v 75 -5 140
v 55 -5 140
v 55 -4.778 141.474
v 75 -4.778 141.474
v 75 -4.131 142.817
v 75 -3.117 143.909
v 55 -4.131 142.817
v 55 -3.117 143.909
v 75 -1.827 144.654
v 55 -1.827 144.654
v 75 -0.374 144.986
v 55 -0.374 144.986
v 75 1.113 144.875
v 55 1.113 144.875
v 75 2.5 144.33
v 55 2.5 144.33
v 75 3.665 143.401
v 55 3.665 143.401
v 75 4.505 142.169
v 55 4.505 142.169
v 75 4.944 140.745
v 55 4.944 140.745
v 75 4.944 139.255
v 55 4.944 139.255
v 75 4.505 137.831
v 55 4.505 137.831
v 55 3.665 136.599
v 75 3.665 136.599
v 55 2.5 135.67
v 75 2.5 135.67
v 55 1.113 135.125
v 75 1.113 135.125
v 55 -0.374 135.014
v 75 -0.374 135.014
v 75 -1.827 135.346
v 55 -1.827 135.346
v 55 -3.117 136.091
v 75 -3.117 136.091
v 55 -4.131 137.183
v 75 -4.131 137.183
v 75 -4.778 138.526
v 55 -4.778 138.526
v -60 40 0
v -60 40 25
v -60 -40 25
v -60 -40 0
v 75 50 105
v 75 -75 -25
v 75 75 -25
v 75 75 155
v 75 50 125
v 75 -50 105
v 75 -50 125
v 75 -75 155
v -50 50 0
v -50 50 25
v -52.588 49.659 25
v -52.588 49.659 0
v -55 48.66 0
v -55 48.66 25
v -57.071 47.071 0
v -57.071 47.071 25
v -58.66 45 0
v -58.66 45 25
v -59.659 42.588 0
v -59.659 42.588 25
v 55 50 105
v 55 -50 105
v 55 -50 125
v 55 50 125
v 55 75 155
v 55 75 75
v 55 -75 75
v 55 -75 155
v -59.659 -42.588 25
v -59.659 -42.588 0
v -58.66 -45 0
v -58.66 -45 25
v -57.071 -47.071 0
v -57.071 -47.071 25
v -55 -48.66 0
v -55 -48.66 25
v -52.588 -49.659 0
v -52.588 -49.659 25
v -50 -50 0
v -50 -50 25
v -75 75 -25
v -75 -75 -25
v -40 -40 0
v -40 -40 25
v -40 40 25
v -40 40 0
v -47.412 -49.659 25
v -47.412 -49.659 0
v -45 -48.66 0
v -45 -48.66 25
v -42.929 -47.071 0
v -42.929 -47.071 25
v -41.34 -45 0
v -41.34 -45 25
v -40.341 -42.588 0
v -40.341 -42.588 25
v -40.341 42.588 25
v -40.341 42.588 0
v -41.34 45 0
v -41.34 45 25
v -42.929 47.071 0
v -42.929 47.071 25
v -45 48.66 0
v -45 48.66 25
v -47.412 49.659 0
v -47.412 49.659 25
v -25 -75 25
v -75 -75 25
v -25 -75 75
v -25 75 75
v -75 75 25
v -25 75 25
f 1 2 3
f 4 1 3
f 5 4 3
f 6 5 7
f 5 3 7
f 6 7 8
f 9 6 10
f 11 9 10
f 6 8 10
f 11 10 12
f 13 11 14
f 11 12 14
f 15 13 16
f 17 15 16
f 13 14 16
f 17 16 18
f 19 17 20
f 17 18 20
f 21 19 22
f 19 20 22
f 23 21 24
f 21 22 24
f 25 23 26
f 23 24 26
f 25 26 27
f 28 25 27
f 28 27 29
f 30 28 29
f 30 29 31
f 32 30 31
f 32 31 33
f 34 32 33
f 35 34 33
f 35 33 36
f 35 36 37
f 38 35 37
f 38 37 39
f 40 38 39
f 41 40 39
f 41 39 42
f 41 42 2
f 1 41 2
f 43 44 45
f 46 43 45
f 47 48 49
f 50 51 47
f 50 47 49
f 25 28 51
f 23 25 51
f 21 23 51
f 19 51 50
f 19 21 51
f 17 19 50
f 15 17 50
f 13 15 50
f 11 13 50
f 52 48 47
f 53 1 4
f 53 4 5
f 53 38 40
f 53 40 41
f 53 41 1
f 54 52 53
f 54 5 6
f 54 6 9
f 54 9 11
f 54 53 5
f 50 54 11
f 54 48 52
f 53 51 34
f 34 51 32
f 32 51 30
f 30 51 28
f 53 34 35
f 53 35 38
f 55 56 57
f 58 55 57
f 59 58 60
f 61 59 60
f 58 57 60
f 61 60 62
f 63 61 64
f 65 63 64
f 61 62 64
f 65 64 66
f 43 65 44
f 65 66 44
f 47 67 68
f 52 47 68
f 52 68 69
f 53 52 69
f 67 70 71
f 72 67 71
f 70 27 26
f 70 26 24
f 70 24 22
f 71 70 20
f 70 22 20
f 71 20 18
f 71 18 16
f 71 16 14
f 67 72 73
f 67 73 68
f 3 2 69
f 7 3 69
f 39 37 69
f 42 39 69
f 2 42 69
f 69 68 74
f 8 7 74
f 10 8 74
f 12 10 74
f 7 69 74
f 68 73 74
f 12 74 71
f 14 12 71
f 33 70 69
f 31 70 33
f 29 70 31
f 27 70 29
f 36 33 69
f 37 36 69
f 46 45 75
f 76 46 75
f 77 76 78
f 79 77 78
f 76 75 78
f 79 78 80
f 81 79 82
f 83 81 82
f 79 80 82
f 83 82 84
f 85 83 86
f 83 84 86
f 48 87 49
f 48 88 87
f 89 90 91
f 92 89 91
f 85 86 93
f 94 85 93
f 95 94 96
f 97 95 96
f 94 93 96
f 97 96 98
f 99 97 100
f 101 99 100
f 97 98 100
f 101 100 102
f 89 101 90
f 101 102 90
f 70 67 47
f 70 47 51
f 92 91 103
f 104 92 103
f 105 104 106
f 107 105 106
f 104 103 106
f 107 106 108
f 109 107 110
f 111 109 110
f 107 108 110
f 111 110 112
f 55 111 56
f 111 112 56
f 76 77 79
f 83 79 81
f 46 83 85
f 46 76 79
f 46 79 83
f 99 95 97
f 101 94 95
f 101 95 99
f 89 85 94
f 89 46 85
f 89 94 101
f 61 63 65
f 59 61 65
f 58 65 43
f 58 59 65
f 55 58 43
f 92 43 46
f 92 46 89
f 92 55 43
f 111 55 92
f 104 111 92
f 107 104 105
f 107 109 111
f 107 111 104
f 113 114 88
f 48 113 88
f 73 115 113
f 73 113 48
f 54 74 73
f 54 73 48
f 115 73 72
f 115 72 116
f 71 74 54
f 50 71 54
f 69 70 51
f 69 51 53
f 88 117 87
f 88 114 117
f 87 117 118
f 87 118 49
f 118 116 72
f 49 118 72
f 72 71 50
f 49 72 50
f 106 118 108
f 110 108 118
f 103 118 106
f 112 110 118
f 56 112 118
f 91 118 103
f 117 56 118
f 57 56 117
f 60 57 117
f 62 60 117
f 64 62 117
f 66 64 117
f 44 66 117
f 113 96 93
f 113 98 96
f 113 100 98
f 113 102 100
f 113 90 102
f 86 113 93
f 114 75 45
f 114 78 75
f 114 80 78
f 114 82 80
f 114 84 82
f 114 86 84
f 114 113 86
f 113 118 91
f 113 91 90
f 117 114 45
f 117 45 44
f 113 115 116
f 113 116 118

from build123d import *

# Parameters (mm, degrees)
F0_W     = 20
F0_H     = 80
F1_DEPTH = 75
F2_W     = 100
F2_H     = 20
F2_R     = 5
F3_DEPTH = 20.001
F5_DEPTH = 25


with BuildPart() as f1:
    # F0 (on Front) → F1 (new body, symmetric)
    with BuildSketch(Plane.XZ):
        Polygon((75, -25), (75, 25), (-25, 25), (-75, 25), (-75, -25), align=None)
        Polygon((-25, 25), (75, 25), (75, 75), (55, 75), (-25, 75), align=None)
        with Locations((65, 115)):
            Rectangle(F0_W, F0_H)
    extrude(amount=F1_DEPTH, both=True)

    # F2 (on face) → F3 (cut, through all)
    with BuildSketch(Plane(origin=(55, 0, 0), x_dir=(0, -1, 0), z_dir=(-1, 0, 0))):
        with Locations((0, 115)):
            Rectangle(F2_W, F2_H)
        with Locations((0, 140)):
            Circle(F2_R)
    extrude(amount=-F3_DEPTH, mode=Mode.SUBTRACT)

    # F4 (on face) → F5 (cut)
    with BuildSketch(Plane.XY.offset(25)):
        with BuildLine():
            Line((-40, -40), (-40, 40))
            ThreePointArc((-40, 40), (-42.928932, 47.071068), (-50, 50))
            ThreePointArc((-50, 50), (-57.071068, 47.071068), (-60, 40))
            Line((-60, 40), (-60, -40))
            ThreePointArc((-60, -40), (-57.071068, -47.071068), (-50, -50))
            ThreePointArc((-50, -50), (-42.928932, -47.071068), (-40, -40))
        make_face()
    extrude(amount=-F5_DEPTH, mode=Mode.SUBTRACT)


solid = f1.part
